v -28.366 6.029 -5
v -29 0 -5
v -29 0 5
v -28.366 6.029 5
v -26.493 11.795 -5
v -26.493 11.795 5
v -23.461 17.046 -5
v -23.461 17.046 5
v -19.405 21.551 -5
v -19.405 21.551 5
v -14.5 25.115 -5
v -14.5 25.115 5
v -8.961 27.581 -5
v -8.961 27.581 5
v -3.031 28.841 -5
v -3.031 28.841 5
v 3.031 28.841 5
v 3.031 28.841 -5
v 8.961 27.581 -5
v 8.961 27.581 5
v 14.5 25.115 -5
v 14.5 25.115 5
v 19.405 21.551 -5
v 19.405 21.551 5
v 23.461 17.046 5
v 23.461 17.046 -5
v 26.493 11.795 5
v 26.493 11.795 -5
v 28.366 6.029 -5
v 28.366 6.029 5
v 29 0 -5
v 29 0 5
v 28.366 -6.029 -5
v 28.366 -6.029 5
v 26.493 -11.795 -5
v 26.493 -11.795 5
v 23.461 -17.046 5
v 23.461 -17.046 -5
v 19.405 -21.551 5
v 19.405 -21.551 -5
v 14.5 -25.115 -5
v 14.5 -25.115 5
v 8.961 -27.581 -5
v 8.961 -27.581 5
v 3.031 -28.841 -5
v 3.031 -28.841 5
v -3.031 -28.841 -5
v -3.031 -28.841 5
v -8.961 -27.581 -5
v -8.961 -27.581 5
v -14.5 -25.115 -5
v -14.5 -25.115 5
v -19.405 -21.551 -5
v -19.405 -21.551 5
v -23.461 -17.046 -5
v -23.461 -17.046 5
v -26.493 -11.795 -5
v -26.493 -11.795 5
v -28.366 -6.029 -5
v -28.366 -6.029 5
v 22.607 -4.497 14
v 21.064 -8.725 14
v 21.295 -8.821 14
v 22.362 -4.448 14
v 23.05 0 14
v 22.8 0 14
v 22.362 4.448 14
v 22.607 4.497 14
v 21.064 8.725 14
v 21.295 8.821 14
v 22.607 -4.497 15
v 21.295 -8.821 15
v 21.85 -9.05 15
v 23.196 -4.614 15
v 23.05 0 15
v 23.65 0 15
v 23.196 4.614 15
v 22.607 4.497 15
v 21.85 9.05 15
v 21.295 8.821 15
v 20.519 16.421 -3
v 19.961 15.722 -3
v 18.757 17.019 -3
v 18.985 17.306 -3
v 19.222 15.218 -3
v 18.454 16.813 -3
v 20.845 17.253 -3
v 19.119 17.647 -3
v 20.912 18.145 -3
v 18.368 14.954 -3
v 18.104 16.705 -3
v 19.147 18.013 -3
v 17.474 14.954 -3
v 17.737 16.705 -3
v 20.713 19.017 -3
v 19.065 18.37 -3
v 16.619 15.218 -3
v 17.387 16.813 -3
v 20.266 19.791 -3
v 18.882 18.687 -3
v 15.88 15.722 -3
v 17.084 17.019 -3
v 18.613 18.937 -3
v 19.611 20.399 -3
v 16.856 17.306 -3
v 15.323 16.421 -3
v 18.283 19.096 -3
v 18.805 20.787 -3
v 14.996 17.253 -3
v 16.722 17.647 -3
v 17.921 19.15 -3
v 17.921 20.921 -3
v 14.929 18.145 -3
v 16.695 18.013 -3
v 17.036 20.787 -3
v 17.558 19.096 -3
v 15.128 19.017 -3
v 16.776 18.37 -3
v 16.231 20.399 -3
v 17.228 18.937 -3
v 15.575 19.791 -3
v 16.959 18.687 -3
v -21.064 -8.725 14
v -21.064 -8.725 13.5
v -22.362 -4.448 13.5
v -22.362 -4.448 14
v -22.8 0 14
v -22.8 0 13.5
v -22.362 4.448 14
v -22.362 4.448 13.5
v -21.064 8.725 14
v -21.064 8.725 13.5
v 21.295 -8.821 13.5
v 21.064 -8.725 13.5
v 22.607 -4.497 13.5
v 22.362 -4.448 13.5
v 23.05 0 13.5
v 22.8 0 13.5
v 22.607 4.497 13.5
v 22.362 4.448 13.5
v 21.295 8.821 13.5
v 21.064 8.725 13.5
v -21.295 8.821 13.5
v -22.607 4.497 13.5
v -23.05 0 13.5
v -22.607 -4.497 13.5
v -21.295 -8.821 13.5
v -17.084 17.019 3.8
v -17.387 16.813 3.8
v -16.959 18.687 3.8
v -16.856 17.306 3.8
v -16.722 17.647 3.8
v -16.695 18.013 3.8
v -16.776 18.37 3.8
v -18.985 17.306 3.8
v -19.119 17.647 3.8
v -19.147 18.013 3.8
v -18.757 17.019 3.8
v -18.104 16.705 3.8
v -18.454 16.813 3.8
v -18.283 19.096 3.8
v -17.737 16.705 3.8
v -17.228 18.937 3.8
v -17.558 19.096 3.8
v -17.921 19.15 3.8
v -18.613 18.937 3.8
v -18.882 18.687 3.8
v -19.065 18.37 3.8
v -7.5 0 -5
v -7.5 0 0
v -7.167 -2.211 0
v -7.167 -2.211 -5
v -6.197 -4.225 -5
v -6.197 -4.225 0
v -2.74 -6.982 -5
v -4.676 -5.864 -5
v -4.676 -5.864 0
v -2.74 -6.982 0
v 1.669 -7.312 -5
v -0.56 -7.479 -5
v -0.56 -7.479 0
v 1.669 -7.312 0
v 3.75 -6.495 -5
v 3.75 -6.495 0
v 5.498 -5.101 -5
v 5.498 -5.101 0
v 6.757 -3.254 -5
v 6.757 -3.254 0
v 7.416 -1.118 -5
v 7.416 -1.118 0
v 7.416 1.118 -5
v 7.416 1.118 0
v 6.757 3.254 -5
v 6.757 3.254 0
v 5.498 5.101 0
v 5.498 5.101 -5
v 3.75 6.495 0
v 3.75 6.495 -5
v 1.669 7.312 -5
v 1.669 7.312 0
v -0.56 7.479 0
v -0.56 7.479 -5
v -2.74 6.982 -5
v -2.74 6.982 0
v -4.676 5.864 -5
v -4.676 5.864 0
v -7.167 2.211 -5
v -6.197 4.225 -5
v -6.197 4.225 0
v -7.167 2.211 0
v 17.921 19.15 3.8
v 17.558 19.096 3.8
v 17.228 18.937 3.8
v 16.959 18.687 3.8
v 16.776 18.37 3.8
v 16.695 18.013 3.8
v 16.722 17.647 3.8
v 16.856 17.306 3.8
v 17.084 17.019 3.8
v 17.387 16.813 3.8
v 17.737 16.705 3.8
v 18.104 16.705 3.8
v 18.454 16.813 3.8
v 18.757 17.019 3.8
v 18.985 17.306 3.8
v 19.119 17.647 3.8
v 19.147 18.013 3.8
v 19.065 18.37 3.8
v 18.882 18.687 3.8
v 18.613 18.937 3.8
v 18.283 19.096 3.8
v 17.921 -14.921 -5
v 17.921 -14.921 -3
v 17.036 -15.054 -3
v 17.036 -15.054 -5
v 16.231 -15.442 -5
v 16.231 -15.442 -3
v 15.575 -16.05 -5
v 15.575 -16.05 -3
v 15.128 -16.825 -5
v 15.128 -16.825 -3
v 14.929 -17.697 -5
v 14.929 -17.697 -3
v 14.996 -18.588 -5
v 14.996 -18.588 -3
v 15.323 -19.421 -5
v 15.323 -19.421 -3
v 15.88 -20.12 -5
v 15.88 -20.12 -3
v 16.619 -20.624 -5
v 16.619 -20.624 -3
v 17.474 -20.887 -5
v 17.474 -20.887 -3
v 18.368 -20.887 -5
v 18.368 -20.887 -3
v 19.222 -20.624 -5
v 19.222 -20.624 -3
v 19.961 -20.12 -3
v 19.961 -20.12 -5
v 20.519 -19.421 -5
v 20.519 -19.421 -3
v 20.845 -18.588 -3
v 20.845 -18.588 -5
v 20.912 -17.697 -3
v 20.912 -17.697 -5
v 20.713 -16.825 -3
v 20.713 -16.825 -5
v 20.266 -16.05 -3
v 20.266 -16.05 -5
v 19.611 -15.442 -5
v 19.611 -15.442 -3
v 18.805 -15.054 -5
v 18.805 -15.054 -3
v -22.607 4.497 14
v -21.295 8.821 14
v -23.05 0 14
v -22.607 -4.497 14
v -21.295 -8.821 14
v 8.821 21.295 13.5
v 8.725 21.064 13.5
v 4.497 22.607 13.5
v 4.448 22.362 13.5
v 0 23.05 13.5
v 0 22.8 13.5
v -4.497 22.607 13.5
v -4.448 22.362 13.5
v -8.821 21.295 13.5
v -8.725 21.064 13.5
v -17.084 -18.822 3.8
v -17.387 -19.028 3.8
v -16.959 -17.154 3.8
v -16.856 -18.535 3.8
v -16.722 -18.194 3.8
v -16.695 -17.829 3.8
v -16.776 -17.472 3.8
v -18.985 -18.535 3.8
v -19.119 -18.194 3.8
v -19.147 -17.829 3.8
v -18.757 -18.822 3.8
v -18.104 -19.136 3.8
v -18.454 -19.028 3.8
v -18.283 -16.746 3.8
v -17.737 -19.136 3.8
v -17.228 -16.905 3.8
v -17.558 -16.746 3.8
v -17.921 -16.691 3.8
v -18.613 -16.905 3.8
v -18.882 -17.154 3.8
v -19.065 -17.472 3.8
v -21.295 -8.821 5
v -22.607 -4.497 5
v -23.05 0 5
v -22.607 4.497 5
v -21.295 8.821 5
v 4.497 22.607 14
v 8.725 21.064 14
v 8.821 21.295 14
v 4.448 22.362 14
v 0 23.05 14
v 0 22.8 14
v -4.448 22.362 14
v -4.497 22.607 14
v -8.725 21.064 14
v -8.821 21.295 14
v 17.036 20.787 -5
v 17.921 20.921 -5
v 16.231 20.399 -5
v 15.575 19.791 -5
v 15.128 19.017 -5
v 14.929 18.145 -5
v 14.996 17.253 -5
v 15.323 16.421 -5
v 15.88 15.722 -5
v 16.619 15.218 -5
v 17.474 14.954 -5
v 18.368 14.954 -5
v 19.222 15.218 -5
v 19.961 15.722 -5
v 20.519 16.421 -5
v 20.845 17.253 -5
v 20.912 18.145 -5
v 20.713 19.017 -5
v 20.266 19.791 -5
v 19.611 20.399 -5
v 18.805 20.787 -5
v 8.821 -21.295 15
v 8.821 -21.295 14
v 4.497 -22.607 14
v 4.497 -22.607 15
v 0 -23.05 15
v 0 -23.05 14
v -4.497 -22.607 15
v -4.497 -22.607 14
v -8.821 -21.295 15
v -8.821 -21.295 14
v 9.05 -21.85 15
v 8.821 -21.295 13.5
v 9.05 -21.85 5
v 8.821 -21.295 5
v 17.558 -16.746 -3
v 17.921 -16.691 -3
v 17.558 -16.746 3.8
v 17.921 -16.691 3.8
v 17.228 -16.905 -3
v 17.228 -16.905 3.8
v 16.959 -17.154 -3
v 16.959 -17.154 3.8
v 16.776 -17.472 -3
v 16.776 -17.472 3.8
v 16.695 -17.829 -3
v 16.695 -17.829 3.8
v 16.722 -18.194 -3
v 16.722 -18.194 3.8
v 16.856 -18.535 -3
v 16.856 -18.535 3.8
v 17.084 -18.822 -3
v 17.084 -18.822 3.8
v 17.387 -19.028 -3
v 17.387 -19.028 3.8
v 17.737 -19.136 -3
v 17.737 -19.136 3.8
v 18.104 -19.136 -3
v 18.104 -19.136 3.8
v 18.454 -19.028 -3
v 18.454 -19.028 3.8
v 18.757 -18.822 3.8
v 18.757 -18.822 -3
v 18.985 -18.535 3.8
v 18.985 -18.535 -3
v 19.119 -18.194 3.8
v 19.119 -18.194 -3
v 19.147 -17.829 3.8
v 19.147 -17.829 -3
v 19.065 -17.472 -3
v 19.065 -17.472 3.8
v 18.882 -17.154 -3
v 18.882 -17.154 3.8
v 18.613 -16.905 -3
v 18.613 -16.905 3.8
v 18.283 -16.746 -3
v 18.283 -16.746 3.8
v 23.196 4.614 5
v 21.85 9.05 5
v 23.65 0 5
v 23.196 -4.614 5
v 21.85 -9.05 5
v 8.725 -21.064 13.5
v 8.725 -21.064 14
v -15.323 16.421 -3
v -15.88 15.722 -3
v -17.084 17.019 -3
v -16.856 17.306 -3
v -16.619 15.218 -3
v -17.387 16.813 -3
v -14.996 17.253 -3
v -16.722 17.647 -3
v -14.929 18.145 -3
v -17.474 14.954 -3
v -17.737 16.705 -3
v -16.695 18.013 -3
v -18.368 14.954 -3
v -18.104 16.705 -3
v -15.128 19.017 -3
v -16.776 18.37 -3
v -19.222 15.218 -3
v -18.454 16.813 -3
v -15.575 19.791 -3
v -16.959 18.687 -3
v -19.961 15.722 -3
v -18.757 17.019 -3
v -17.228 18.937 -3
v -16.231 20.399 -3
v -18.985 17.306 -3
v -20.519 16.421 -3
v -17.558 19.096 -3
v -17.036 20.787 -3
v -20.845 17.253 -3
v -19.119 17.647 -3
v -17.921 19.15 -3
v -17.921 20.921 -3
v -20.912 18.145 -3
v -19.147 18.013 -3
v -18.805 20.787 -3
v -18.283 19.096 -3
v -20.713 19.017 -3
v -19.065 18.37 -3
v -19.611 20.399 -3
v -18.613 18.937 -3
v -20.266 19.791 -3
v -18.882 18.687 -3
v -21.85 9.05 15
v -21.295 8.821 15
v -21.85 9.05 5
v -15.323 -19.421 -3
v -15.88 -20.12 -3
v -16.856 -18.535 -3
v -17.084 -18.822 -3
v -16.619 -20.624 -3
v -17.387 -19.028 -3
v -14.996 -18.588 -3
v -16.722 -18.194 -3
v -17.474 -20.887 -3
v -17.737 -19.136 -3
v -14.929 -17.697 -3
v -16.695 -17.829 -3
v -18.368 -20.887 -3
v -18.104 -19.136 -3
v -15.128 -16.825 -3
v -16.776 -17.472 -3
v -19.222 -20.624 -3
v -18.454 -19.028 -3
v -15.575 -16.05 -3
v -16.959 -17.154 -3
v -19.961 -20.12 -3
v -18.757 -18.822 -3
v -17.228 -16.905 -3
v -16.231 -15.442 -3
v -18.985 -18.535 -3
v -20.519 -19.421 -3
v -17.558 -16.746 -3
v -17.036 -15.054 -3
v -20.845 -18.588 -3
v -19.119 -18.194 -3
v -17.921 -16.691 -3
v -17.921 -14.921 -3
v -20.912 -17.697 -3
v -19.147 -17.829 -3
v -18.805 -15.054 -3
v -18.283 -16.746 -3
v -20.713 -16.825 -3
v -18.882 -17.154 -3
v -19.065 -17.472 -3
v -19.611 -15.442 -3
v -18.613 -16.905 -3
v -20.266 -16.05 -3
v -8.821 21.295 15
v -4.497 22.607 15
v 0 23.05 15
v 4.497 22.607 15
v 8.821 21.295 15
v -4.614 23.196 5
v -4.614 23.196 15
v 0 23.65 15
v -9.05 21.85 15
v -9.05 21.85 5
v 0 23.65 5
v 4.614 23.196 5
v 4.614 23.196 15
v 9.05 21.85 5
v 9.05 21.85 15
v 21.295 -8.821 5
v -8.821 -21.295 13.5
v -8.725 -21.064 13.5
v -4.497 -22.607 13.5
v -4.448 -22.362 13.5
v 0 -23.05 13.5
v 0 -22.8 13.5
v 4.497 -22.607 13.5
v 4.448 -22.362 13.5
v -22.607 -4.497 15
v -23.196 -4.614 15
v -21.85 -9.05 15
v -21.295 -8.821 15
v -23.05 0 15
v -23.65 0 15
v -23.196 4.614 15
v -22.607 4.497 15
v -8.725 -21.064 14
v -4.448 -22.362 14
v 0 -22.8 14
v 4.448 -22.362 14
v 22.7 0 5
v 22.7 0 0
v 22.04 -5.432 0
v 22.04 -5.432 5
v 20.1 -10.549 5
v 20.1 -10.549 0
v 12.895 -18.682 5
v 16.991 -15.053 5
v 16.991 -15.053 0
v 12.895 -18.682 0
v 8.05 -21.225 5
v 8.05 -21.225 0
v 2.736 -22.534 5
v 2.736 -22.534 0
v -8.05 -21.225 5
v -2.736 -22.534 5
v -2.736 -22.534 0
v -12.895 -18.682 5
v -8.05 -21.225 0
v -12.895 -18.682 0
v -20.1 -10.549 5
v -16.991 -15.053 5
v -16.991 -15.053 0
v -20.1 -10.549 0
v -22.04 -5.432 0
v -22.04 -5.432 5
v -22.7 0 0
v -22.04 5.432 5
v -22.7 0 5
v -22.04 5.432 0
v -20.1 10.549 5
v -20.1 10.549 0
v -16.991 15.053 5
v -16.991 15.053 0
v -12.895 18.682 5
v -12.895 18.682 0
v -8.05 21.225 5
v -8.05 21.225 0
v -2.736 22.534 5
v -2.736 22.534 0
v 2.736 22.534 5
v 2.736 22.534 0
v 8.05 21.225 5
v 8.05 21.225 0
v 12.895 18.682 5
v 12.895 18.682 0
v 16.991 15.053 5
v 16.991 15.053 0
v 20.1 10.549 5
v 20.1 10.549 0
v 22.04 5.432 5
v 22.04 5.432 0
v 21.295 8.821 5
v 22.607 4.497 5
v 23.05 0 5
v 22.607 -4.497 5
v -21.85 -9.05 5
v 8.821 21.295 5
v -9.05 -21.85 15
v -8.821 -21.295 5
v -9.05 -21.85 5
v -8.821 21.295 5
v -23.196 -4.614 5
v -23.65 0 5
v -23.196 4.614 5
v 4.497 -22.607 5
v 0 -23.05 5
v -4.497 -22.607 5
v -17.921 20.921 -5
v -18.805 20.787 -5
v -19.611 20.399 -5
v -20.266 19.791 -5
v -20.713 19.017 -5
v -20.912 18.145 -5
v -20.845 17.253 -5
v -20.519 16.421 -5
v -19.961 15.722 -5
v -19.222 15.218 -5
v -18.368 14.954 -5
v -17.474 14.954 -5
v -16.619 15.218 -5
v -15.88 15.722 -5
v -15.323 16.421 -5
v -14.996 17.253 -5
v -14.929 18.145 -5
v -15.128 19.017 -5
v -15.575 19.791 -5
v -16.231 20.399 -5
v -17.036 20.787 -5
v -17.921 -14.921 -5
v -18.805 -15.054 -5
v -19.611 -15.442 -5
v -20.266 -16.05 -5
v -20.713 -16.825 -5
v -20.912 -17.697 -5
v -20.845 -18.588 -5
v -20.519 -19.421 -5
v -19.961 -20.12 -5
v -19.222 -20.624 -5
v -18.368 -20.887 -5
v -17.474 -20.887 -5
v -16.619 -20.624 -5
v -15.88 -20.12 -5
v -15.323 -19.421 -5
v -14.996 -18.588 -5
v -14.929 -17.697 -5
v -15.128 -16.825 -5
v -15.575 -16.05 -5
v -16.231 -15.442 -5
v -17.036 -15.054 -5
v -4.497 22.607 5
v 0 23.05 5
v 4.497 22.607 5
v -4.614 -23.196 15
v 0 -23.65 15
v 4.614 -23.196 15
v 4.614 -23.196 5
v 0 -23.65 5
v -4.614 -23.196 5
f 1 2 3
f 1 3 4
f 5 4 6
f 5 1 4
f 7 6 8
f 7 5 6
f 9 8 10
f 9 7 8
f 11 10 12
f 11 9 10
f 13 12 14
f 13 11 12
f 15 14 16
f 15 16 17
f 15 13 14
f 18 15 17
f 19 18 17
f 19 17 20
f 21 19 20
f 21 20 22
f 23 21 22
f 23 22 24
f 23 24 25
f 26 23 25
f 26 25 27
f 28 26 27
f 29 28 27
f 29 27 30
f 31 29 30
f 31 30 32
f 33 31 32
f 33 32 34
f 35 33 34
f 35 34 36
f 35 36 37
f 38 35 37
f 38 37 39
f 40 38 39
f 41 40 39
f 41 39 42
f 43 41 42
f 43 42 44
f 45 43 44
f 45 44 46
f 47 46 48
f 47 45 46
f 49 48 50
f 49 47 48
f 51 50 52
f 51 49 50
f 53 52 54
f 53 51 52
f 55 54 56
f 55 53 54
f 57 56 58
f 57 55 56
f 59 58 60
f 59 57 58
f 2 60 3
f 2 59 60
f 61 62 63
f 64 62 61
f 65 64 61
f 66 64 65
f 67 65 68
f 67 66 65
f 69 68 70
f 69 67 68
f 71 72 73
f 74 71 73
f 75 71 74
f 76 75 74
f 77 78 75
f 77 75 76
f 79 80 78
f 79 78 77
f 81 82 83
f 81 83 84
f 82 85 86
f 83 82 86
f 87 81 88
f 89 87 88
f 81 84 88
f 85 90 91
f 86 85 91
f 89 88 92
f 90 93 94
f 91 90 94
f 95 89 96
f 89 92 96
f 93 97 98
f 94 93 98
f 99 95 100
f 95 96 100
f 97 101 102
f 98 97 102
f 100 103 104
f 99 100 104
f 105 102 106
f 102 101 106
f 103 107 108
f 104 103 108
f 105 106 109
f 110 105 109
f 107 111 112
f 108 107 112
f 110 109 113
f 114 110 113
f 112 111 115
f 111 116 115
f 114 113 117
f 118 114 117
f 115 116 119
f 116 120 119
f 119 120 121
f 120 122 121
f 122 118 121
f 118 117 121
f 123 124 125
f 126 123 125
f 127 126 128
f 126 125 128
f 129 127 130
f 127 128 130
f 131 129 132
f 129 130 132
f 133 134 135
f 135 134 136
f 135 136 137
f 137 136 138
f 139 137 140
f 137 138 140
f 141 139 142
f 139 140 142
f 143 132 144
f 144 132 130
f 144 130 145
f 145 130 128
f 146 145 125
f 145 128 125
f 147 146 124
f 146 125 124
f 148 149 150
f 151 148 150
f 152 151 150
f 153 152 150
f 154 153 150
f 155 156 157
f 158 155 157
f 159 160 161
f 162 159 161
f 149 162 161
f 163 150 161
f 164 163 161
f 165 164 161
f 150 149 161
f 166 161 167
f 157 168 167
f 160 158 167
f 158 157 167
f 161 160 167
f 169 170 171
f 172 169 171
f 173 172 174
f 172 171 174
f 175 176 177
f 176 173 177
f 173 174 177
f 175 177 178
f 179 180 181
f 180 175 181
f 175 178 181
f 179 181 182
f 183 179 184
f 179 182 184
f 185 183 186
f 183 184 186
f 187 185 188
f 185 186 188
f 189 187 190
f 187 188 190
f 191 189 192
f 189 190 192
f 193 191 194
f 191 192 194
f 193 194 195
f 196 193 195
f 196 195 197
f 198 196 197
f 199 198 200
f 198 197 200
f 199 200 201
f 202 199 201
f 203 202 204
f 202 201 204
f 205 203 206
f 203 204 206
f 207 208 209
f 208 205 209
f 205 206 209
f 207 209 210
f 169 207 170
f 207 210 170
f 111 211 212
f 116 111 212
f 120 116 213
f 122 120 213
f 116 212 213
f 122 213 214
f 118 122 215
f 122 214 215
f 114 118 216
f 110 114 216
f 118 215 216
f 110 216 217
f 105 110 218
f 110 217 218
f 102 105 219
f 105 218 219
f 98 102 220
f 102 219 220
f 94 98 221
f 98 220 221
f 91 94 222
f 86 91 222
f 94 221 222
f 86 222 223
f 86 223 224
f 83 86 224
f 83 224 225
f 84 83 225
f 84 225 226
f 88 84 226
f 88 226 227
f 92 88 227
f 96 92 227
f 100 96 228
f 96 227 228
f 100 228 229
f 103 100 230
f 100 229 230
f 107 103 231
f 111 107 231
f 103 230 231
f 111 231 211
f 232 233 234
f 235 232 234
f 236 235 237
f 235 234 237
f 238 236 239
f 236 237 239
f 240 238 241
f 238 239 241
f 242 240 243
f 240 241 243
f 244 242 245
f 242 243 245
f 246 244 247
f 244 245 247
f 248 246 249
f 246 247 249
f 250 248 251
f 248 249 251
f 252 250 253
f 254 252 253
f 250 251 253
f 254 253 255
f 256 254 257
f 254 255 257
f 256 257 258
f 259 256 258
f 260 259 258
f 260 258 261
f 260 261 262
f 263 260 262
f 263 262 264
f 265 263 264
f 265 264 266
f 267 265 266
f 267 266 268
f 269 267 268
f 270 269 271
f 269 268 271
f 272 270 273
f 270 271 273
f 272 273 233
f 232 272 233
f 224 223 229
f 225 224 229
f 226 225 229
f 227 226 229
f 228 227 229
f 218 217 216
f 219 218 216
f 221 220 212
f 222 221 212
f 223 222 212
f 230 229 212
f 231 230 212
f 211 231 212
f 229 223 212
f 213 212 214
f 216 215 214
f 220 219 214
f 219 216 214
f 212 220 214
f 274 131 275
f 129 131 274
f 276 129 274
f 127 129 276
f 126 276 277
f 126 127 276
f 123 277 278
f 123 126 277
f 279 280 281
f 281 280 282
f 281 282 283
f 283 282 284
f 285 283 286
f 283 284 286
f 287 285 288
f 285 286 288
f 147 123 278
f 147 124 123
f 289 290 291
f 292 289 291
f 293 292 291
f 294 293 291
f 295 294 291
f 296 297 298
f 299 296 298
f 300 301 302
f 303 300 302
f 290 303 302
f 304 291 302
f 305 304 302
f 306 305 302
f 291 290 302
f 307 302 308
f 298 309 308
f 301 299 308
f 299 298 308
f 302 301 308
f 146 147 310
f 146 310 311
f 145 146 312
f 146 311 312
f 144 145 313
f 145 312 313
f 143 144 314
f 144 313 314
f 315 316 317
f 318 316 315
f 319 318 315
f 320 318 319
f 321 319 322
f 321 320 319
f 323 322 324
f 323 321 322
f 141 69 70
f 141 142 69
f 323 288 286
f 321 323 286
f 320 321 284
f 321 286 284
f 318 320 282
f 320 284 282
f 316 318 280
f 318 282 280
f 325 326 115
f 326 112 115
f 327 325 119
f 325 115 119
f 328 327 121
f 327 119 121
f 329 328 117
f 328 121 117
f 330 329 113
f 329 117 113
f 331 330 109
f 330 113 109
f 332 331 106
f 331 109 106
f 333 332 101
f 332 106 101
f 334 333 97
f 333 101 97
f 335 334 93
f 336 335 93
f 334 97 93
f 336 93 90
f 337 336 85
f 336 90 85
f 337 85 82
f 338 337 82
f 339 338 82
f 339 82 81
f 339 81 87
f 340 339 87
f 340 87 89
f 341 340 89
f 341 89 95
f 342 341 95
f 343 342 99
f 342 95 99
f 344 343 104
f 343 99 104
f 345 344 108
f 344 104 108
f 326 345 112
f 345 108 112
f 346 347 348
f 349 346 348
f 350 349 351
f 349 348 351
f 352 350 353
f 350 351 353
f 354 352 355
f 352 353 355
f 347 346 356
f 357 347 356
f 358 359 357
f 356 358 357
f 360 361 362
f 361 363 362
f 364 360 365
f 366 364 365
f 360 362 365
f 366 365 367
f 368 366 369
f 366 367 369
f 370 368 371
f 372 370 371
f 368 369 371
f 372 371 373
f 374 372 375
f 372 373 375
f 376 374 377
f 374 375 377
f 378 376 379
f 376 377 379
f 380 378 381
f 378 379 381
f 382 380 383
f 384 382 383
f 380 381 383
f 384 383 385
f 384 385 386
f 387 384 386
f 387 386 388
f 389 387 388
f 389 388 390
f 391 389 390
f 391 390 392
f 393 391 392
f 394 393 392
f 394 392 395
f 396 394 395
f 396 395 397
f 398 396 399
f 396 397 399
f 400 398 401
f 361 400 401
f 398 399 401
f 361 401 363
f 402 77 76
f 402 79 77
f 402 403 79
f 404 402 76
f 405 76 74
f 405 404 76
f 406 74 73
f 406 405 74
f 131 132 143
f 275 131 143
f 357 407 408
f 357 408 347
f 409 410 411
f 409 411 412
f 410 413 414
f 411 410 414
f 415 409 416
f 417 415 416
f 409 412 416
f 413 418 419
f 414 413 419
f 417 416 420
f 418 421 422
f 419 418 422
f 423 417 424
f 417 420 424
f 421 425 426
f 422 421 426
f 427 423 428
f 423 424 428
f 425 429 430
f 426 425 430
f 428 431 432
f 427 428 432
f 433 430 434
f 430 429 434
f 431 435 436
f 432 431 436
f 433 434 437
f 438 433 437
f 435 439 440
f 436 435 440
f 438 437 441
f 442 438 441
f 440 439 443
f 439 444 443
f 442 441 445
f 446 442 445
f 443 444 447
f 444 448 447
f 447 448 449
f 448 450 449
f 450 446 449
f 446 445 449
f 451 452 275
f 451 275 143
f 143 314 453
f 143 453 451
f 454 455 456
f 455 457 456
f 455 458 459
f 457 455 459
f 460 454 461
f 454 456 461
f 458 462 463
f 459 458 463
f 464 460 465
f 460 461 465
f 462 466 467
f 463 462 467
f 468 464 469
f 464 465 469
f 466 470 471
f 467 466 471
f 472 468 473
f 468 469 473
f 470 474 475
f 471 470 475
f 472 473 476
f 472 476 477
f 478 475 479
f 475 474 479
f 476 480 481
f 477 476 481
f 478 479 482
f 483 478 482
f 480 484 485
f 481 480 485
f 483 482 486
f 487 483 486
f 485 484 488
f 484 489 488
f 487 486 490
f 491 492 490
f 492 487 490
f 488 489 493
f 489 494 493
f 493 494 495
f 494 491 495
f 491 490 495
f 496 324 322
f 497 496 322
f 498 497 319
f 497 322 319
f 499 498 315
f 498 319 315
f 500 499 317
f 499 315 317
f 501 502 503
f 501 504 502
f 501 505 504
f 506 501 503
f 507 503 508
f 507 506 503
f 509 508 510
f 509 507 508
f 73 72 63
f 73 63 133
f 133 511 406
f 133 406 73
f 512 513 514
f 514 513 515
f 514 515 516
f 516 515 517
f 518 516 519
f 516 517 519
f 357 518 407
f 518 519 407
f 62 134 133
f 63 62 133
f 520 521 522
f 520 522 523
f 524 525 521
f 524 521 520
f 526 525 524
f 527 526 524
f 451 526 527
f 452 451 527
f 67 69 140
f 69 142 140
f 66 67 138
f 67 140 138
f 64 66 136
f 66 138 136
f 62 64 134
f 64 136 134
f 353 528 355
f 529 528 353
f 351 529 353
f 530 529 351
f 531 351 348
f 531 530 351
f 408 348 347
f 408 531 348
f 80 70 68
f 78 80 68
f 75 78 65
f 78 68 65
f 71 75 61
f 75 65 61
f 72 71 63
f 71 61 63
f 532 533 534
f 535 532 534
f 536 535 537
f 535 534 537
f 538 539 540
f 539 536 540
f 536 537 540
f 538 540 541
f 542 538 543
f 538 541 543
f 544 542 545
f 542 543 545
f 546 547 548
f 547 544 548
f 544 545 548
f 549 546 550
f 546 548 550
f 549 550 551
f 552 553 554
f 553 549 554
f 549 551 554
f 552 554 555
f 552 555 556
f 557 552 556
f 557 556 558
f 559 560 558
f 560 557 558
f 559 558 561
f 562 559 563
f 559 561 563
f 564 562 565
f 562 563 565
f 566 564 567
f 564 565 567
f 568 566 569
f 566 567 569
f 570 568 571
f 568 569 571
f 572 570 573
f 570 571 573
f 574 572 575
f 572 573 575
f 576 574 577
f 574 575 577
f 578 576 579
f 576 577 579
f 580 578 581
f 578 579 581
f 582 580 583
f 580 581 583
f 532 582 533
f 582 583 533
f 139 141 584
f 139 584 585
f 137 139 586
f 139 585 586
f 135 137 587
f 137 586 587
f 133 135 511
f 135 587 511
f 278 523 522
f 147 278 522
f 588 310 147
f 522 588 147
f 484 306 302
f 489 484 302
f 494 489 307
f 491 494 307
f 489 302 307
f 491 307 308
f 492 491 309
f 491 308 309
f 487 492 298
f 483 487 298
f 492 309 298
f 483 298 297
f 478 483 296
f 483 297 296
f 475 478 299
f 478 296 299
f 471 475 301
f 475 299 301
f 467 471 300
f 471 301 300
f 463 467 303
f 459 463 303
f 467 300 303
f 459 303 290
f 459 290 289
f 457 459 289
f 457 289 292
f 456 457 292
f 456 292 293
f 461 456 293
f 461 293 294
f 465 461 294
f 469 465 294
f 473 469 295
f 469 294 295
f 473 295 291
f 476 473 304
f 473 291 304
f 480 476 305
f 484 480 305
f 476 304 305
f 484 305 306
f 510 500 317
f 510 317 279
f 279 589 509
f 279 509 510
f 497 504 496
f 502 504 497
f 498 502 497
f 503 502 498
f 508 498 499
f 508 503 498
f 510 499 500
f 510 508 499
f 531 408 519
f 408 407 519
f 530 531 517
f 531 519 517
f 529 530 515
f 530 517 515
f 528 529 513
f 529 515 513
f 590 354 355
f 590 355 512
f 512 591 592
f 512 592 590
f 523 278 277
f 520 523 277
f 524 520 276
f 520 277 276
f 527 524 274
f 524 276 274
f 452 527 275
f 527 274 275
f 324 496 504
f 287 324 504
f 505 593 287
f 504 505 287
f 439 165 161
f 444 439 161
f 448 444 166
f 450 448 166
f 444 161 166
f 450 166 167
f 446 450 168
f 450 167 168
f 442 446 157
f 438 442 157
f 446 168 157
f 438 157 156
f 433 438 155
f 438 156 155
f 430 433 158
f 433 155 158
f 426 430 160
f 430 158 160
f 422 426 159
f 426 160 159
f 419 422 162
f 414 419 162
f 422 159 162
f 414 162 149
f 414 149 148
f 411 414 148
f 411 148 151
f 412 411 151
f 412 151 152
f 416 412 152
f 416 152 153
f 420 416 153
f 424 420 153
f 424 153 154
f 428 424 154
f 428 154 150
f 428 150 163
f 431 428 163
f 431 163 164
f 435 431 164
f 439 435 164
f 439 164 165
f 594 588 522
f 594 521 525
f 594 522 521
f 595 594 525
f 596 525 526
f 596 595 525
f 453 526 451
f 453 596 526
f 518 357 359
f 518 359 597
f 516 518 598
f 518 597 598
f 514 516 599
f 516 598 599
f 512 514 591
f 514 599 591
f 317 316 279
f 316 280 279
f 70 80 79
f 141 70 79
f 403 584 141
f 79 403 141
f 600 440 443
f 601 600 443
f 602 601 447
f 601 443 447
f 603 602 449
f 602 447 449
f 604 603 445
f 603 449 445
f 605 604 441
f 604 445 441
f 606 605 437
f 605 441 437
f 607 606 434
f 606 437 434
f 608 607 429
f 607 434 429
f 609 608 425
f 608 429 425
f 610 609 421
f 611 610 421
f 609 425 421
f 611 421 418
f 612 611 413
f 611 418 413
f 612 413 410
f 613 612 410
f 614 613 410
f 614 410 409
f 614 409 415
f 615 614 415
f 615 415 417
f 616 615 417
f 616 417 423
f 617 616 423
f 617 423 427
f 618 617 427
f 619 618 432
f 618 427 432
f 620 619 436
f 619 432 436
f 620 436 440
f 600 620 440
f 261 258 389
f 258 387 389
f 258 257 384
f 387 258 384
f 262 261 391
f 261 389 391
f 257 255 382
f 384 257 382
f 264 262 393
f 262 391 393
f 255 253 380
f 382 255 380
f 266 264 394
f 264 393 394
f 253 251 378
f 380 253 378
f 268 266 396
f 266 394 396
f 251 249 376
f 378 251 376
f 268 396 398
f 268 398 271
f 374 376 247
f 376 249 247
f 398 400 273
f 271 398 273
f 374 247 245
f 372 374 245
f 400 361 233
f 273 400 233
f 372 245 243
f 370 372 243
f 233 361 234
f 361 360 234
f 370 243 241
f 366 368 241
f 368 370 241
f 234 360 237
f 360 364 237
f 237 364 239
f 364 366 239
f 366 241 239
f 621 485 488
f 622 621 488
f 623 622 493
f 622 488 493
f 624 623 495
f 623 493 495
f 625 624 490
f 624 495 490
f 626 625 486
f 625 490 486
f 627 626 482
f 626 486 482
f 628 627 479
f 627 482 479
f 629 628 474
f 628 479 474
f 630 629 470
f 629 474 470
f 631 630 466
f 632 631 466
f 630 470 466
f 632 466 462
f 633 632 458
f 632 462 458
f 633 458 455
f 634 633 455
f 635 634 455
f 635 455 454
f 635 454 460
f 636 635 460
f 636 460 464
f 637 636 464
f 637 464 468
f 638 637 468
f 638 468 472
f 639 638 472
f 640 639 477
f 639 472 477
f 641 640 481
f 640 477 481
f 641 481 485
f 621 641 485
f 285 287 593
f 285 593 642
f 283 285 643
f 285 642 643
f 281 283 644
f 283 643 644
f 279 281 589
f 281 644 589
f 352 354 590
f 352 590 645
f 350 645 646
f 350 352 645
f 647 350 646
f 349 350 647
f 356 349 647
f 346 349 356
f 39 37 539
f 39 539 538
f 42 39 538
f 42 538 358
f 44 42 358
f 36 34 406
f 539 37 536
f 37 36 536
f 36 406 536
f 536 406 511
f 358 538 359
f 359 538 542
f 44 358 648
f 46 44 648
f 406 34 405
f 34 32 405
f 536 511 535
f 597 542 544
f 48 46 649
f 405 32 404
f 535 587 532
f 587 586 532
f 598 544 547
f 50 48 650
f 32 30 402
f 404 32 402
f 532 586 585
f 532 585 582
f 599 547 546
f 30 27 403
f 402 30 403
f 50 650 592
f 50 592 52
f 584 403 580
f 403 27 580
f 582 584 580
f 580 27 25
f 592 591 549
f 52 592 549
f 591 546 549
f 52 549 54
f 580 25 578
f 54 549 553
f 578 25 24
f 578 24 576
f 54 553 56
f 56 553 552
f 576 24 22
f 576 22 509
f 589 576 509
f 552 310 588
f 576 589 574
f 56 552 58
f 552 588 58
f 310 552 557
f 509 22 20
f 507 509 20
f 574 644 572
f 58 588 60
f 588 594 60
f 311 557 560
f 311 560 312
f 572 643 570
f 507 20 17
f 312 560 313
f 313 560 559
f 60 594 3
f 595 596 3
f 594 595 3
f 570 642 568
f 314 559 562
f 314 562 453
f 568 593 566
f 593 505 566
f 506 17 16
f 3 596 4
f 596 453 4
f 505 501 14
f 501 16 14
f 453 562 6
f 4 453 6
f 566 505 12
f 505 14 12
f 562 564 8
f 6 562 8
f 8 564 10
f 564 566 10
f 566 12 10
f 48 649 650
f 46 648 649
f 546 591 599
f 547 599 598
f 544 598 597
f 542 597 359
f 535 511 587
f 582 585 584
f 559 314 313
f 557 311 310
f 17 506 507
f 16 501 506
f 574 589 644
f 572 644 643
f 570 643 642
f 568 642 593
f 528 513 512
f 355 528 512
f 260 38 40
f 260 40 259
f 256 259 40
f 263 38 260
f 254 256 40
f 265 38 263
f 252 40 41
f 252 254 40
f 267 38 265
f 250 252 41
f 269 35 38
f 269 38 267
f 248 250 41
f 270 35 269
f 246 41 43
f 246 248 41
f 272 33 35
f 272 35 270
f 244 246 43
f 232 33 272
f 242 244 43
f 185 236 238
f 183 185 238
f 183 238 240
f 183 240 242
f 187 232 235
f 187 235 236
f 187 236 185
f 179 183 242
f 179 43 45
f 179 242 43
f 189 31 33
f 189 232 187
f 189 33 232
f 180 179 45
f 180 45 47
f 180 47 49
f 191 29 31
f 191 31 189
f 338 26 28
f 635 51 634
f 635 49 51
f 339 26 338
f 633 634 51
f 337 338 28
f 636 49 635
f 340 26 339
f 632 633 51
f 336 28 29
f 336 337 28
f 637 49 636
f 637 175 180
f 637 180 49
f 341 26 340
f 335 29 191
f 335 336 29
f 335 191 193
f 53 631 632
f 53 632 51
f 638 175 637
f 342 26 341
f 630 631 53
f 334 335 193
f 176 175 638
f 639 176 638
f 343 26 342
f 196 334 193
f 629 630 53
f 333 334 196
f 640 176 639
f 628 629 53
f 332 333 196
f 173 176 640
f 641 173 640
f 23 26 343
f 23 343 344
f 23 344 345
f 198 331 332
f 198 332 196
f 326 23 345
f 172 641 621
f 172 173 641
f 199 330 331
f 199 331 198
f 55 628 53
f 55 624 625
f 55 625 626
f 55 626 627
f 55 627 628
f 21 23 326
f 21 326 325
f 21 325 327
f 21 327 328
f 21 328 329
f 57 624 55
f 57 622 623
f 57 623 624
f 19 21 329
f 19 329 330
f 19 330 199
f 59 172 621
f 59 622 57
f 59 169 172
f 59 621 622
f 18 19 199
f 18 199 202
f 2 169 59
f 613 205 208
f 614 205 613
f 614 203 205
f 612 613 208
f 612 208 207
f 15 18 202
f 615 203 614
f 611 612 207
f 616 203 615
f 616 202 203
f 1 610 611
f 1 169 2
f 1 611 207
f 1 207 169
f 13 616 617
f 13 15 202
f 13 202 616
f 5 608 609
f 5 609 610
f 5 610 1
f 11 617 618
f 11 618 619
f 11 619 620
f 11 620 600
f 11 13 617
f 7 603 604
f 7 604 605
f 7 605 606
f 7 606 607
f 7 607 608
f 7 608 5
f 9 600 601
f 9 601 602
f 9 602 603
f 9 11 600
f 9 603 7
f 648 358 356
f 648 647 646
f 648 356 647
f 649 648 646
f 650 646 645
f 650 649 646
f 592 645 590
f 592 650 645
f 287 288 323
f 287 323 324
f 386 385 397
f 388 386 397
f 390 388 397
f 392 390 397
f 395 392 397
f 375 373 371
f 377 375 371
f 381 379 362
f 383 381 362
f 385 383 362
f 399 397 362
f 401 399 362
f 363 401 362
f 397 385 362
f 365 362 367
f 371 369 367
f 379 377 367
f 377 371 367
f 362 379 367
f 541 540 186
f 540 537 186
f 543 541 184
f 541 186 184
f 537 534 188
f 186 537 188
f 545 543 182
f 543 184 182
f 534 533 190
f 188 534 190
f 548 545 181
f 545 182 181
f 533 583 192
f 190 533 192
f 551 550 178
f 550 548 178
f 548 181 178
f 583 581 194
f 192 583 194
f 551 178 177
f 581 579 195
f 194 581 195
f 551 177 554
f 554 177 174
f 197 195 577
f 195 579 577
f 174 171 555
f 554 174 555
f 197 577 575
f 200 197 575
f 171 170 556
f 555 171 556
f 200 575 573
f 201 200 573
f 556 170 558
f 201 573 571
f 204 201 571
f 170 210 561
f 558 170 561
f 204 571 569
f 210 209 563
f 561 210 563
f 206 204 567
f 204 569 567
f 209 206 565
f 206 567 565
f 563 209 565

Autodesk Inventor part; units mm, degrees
ref_plane "YZ Plane" through (0, 0, 0) normal (1, 0, 0) x (0, 1, 0)
ref_plane "XZ Plane" through (0, 0, 0) normal (0, 1, 0) x (-1, 0, 0)
sketch "Sketch1" plane through (0, 0, 0) normal (0, 0, 1) x (1, 0, 0)
  circle A0 centre (0, 0) radius 24
  circle A1 centre (0, 0) radius 22.7
  dimension "d0" = 48
  dimension "d1" = 45.4
extrude "Extrusion1" add sketch "Sketch1" along normal blind 5
sketch "Sketch2" plane through (0, 0, 0) normal (0, 0, -1) x (-1, 0, 0)
  circle A0 centre (0, 0) radius 24 projected
  circle A1 centre (0, 0) radius 7.5
  dimension "d4" = 15
extrude "Extrusion2" add sketch "Sketch2" along normal blind 5
sketch "Sketch3" plane through (0, 0, 5) normal (0, 0, 1) x (1, 0, 0)
  circle A0 centre (0, 0) radius 22.7 projected
  circle A1 centre (0, 0) radius 24 projected
  arc A2 (8.8209, 21.2954) -> (-8.8209, 21.2954) centre (0, 0) ccw
  arc A3 (9.0505, 21.8498) -> (-9.0505, 21.8498) centre (0, 0) ccw
  circle A4 centre (0, 0) radius 7.5 projected
  line L0 (0, 0) -> (0, 19.001)
  line L1 (-8.8209, 21.2954) -> (-9.0505, 21.8498)
  line L2 (8.8209, 21.2954) -> (9.0505, 21.8498)
  arc A5 (-21.2954, 8.8209) -> (-21.2954, -8.8209) centre (0, 0) ccw
  arc A6 (-21.8498, 9.0505) -> (-21.8498, -9.0505) centre (0, 0) ccw
  line L3 (-21.2954, -8.8209) -> (-21.8498, -9.0505)
  line L4 (-21.2954, 8.8209) -> (-21.8498, 9.0505)
  arc A7 (-8.8209, -21.2954) -> (8.8209, -21.2954) centre (0, 0) ccw
  arc A8 (-9.0505, -21.8498) -> (9.0505, -21.8498) centre (0, 0) ccw
  line L5 (8.8209, -21.2954) -> (9.0505, -21.8498)
  line L6 (-8.8209, -21.2954) -> (-9.0505, -21.8498)
  arc A9 (21.2954, -8.8209) -> (21.2954, 8.8209) centre (0, 0) ccw
  arc A10 (21.8498, -9.0505) -> (21.8498, 9.0505) centre (0, 0) ccw
  line L7 (21.2954, 8.8209) -> (21.8498, 9.0505)
  line L8 (21.2954, -8.8209) -> (21.8498, -9.0505)
  point P0 (-19.001, 0)
  point P1 (0, -19.001)
  point P2 (19.001, 0)
  dimension "d7" = 0.35
  dimension "d8" = 0.35
  dimension "d13" = 360
extrude "Extrusion3" add sketch "Sketch3" along normal blind 10 contours A2 L1 A3 L2 | A5 L3 A6 L4 | A7 L5 A8 L6 | A9 L7 A10 L8
ref_plane "Work Plane2" through (0, 0, 13.75) normal (0, 0, 1) x (1, 0, 0)
sketch "Sketch6" plane through (0, 0, 13.75) normal (0, 0, 1) x (1, 0, 0)
  arc A0 (-8.8209, -21.2954) -> (8.8209, -21.2954) centre (0, 0) ccw projected
  arc A1 (-8.7252, -21.0645) -> (8.7252, -21.0645) centre (0, 0) ccw
  line L0 (-8.7252, -21.0645) -> (-8.8209, -21.2954)
  line L1 (8.7252, -21.0645) -> (8.8209, -21.2954)
  dimension "d19" = 0.25
extrude "Extrusion4" add sketch "Sketch6" along normal mid plane 0.5
pattern_circular "Circular Pattern1" count 4 over 360 about axis through (0, 0, -10) along (0, 0, 1) of "Extrusion4"
sketch "Sketch7" plane through (0, 0, -5) normal (0, 0, -1) x (-1, 0, 0)
  circle A0 centre (0, 0) radius 7.5 projected
  circle A1 centre (0, 0) radius 29
  circle A2 centre (0, 0) radius 24 projected
  dimension "d26" = 58
extrude "Extrusion5" add sketch "Sketch7" against normal blind 10 contours A1
sketch "Sketch8" plane through (0, 0, -5) normal (0, 0, -1) x (-1, 0, 0)
  circle A0 centre (17.9207, 17.9207) radius 1.425
  circle A1 centre (17.9207, -17.9207) radius 1.425
  circle A2 centre (-17.9207, -17.9207) radius 1.425
  circle A3 centre (-17.9207, 17.9207) radius 1.425
  point P0 (0, 0)
  point P1 (0, 0)
hole "Hole1" at (17.9207, 17.9207, -5) at (17.9207, -17.9207, -5) at (-17.9207, -17.9207, -5) at (-17.9207, 17.9207, -5) direction (0, 0, 1) diameter 2.459 depth 8.8 counterbore diameter 6 counterbore depth 2 thread size "M3x0.5" class "6H" standard "ISO Metric profile"
equation "\"d10\" = 0.5 * d9"
equation "\"d9\" = 45deg"
properties part number "Housing of planetary gearbox" material "Steel, Alloy"
